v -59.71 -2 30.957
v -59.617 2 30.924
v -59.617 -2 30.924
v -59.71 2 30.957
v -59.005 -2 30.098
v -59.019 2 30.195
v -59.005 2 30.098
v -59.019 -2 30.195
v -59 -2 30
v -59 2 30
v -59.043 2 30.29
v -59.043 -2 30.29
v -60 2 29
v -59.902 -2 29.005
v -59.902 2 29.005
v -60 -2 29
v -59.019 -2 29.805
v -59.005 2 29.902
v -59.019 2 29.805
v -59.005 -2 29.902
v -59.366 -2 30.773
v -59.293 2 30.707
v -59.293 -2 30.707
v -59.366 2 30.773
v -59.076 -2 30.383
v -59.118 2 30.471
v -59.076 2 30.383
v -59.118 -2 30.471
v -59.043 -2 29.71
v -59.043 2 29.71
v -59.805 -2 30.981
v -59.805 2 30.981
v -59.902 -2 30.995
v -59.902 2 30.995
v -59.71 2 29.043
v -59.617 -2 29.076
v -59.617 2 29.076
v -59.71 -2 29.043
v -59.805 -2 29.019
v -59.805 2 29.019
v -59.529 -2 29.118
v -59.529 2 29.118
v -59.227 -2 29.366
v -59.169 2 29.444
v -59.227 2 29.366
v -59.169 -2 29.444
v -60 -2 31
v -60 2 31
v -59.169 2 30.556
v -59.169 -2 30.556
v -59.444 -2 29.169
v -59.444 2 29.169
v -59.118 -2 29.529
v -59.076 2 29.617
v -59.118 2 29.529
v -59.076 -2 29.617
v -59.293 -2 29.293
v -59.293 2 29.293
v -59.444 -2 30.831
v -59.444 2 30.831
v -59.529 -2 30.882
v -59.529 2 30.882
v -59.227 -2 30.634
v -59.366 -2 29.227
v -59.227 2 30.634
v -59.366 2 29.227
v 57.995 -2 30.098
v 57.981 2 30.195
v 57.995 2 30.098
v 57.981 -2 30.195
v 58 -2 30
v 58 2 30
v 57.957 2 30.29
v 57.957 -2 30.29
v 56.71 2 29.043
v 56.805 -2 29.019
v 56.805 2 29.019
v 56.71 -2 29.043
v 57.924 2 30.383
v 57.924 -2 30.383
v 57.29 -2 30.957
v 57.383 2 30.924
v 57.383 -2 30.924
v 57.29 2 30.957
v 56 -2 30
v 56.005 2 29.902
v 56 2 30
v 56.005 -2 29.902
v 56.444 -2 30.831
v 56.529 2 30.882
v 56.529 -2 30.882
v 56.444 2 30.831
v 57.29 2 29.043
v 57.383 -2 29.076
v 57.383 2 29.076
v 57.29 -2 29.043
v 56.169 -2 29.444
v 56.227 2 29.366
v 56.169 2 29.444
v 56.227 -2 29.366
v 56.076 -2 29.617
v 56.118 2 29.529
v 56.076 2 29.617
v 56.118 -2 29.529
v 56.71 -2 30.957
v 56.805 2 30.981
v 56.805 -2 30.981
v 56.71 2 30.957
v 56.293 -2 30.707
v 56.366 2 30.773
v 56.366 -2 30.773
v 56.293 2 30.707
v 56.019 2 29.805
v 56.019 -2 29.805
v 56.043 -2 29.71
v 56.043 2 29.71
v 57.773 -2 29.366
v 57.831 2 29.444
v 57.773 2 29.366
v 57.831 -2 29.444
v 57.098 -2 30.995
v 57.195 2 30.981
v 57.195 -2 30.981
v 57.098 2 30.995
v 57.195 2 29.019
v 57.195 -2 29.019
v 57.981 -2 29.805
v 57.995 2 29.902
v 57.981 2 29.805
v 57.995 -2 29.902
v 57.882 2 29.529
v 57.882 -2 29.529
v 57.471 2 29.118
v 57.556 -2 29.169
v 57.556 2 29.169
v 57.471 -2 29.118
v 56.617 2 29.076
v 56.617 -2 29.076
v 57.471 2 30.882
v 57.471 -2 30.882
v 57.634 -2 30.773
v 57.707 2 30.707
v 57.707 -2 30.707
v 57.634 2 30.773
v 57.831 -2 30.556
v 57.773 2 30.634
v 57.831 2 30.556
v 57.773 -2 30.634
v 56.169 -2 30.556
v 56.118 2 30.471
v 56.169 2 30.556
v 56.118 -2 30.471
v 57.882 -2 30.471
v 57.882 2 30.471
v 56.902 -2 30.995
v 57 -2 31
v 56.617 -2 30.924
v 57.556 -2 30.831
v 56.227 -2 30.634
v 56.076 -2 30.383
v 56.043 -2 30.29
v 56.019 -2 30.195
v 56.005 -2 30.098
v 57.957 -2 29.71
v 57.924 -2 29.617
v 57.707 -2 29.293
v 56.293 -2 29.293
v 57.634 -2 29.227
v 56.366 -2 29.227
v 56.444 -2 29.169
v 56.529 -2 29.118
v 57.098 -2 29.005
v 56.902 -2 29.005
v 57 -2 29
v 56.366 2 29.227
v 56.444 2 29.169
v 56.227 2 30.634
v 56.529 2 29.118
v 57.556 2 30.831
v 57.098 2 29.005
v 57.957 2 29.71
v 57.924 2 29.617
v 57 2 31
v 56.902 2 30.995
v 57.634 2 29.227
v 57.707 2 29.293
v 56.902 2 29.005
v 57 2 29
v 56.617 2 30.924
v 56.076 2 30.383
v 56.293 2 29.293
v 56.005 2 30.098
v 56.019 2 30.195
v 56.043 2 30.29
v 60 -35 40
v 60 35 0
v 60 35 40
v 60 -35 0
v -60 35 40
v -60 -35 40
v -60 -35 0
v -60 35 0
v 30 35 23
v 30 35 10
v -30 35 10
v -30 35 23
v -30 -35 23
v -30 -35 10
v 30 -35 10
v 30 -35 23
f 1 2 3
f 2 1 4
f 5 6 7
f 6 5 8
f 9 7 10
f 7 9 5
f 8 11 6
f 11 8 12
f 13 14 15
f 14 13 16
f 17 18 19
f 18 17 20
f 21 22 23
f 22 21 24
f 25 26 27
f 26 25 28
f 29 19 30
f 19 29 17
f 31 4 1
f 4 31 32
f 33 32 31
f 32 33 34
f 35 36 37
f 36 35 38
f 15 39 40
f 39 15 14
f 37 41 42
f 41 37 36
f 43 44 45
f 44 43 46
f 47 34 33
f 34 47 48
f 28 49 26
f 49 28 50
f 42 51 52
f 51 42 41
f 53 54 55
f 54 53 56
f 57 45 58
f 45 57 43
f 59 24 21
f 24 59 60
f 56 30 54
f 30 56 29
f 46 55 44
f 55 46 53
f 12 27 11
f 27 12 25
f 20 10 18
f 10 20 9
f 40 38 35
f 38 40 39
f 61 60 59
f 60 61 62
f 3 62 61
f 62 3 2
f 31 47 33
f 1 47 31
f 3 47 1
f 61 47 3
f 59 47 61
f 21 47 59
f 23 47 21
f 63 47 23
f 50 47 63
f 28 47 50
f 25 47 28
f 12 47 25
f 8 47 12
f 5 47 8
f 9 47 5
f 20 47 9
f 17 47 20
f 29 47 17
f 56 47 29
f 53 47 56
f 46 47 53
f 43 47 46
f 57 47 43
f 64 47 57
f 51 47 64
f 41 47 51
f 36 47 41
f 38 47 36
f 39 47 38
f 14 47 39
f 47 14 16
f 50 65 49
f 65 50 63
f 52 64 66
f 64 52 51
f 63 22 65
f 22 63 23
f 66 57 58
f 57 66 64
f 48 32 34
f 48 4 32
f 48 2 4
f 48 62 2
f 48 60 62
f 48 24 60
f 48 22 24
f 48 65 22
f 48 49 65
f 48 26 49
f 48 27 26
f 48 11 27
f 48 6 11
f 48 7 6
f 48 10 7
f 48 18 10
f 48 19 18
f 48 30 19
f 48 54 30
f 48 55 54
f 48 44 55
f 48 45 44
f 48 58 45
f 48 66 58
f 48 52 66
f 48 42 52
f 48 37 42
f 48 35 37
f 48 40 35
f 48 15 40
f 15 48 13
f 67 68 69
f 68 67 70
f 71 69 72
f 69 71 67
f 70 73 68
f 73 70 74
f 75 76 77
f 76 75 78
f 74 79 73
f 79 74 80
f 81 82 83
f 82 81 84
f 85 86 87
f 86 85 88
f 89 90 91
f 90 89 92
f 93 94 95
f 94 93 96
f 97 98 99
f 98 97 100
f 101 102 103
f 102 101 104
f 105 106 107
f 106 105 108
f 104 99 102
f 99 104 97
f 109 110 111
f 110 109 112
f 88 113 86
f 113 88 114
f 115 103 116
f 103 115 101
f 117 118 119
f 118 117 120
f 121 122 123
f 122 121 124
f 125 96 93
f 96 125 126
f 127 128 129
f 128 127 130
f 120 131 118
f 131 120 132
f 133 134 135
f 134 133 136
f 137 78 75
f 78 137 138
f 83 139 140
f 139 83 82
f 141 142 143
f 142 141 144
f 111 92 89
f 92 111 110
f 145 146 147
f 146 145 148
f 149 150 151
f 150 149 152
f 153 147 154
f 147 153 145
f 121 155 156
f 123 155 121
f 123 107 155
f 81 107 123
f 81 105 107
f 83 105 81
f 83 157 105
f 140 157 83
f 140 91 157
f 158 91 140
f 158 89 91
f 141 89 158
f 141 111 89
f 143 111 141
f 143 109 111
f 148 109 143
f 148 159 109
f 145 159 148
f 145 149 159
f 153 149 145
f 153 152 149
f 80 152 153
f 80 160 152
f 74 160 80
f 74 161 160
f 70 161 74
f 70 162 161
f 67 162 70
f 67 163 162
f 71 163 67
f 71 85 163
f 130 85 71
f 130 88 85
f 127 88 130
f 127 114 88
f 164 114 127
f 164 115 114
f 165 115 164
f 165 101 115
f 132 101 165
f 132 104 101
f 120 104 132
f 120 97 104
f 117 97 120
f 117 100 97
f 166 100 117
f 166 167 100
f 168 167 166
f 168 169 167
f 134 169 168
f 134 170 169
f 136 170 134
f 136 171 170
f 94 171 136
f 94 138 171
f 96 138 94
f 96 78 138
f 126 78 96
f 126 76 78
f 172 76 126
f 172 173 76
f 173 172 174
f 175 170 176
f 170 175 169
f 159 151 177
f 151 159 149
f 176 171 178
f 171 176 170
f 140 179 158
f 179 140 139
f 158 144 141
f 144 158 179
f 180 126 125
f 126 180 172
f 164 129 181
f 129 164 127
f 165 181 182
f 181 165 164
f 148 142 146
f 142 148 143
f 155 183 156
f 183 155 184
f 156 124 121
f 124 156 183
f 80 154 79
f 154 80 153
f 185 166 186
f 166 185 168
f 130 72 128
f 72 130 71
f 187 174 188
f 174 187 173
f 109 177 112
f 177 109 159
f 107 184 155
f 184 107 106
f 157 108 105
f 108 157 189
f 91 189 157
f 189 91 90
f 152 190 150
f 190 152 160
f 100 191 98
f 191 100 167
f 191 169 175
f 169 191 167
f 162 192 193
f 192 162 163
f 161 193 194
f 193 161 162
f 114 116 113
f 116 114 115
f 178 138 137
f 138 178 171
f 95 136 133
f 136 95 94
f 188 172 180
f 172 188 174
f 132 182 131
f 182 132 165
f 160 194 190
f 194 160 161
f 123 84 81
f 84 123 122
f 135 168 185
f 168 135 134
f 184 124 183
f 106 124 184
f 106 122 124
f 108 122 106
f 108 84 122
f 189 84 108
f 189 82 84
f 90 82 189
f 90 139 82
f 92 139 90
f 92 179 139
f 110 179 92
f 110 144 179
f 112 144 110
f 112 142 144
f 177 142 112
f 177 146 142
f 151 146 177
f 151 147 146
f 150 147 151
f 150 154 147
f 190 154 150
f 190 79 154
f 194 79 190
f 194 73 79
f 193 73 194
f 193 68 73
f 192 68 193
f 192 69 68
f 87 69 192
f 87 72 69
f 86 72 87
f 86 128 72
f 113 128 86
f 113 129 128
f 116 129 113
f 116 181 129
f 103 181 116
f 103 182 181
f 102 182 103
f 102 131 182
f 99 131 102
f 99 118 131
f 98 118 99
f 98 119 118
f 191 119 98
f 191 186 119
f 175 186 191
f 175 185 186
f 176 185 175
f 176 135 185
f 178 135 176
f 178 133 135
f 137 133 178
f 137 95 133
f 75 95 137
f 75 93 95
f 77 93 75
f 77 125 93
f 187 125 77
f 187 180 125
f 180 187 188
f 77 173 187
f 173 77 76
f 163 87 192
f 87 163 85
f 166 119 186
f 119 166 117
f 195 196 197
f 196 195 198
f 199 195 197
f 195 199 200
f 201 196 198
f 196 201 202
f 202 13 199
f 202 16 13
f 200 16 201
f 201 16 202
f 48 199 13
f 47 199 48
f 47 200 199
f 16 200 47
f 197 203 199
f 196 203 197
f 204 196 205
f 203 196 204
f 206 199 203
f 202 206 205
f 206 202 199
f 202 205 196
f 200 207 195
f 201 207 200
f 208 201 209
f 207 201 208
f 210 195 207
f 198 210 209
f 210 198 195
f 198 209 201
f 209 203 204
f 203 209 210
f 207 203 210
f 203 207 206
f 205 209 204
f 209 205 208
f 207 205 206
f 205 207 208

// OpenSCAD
// Mini horizontal gel-electrophoresis box - buffer tank
// Print orientation: tank base on XY plane, opening upward (+Z)

// ---------------- Parameters ----------------
outer_x      = 120;   // outer length along X (mm)
outer_y      = 70;    // outer width along Y (mm)
outer_h      = 40;    // outer height along Z (mm)

wall         = 3;     // wall thickness (mm)
floor        = 3;     // floor thickness (mm)

platform_x   = 60;    // platform length along X (mm)
platform_y   = outer_y; // platform spans full inner width (mm)
platform_top = 13;    // platform top height above tank base (mm)

hole_d       = 2;     // electrode wire hole diameter (mm)
hole_y       = 0;     // hole centre Y position (mm)
hole_z       = 30;    // hole centre Z position (mm)

eps          = 0.5;   // cutter overshoot past faces (mm)

$fn = 64;

// ---------------- Derived ----------------
inner_x = outer_x - 2 * wall;      // 114 mm
inner_z = outer_h - floor;         // 37 mm (floor at bottom)

// ---------------- Model ----------------
difference() {
    // Main tank body (solid block, open top)
    translate([-outer_x / 2, -outer_y / 2, 0])
        cube([outer_x, outer_y, outer_h]);

    // Gel tray platform, centred in X, full width in Y
    translate([-platform_x / 2, -platform_y / 2, platform_top - floor])
        cube([platform_x, platform_y, floor + 10]);

    // Electrode wire holes through each end wall, along X
    for (sx = [-1, 1])
        translate([sx > 0 ? outer_x / 2 - wall : -outer_x / 2, hole_y, hole_z])
            rotate([90, 0, 0])
                cylinder(d = hole_d, h = wall + 2 * eps, center = true);
}
